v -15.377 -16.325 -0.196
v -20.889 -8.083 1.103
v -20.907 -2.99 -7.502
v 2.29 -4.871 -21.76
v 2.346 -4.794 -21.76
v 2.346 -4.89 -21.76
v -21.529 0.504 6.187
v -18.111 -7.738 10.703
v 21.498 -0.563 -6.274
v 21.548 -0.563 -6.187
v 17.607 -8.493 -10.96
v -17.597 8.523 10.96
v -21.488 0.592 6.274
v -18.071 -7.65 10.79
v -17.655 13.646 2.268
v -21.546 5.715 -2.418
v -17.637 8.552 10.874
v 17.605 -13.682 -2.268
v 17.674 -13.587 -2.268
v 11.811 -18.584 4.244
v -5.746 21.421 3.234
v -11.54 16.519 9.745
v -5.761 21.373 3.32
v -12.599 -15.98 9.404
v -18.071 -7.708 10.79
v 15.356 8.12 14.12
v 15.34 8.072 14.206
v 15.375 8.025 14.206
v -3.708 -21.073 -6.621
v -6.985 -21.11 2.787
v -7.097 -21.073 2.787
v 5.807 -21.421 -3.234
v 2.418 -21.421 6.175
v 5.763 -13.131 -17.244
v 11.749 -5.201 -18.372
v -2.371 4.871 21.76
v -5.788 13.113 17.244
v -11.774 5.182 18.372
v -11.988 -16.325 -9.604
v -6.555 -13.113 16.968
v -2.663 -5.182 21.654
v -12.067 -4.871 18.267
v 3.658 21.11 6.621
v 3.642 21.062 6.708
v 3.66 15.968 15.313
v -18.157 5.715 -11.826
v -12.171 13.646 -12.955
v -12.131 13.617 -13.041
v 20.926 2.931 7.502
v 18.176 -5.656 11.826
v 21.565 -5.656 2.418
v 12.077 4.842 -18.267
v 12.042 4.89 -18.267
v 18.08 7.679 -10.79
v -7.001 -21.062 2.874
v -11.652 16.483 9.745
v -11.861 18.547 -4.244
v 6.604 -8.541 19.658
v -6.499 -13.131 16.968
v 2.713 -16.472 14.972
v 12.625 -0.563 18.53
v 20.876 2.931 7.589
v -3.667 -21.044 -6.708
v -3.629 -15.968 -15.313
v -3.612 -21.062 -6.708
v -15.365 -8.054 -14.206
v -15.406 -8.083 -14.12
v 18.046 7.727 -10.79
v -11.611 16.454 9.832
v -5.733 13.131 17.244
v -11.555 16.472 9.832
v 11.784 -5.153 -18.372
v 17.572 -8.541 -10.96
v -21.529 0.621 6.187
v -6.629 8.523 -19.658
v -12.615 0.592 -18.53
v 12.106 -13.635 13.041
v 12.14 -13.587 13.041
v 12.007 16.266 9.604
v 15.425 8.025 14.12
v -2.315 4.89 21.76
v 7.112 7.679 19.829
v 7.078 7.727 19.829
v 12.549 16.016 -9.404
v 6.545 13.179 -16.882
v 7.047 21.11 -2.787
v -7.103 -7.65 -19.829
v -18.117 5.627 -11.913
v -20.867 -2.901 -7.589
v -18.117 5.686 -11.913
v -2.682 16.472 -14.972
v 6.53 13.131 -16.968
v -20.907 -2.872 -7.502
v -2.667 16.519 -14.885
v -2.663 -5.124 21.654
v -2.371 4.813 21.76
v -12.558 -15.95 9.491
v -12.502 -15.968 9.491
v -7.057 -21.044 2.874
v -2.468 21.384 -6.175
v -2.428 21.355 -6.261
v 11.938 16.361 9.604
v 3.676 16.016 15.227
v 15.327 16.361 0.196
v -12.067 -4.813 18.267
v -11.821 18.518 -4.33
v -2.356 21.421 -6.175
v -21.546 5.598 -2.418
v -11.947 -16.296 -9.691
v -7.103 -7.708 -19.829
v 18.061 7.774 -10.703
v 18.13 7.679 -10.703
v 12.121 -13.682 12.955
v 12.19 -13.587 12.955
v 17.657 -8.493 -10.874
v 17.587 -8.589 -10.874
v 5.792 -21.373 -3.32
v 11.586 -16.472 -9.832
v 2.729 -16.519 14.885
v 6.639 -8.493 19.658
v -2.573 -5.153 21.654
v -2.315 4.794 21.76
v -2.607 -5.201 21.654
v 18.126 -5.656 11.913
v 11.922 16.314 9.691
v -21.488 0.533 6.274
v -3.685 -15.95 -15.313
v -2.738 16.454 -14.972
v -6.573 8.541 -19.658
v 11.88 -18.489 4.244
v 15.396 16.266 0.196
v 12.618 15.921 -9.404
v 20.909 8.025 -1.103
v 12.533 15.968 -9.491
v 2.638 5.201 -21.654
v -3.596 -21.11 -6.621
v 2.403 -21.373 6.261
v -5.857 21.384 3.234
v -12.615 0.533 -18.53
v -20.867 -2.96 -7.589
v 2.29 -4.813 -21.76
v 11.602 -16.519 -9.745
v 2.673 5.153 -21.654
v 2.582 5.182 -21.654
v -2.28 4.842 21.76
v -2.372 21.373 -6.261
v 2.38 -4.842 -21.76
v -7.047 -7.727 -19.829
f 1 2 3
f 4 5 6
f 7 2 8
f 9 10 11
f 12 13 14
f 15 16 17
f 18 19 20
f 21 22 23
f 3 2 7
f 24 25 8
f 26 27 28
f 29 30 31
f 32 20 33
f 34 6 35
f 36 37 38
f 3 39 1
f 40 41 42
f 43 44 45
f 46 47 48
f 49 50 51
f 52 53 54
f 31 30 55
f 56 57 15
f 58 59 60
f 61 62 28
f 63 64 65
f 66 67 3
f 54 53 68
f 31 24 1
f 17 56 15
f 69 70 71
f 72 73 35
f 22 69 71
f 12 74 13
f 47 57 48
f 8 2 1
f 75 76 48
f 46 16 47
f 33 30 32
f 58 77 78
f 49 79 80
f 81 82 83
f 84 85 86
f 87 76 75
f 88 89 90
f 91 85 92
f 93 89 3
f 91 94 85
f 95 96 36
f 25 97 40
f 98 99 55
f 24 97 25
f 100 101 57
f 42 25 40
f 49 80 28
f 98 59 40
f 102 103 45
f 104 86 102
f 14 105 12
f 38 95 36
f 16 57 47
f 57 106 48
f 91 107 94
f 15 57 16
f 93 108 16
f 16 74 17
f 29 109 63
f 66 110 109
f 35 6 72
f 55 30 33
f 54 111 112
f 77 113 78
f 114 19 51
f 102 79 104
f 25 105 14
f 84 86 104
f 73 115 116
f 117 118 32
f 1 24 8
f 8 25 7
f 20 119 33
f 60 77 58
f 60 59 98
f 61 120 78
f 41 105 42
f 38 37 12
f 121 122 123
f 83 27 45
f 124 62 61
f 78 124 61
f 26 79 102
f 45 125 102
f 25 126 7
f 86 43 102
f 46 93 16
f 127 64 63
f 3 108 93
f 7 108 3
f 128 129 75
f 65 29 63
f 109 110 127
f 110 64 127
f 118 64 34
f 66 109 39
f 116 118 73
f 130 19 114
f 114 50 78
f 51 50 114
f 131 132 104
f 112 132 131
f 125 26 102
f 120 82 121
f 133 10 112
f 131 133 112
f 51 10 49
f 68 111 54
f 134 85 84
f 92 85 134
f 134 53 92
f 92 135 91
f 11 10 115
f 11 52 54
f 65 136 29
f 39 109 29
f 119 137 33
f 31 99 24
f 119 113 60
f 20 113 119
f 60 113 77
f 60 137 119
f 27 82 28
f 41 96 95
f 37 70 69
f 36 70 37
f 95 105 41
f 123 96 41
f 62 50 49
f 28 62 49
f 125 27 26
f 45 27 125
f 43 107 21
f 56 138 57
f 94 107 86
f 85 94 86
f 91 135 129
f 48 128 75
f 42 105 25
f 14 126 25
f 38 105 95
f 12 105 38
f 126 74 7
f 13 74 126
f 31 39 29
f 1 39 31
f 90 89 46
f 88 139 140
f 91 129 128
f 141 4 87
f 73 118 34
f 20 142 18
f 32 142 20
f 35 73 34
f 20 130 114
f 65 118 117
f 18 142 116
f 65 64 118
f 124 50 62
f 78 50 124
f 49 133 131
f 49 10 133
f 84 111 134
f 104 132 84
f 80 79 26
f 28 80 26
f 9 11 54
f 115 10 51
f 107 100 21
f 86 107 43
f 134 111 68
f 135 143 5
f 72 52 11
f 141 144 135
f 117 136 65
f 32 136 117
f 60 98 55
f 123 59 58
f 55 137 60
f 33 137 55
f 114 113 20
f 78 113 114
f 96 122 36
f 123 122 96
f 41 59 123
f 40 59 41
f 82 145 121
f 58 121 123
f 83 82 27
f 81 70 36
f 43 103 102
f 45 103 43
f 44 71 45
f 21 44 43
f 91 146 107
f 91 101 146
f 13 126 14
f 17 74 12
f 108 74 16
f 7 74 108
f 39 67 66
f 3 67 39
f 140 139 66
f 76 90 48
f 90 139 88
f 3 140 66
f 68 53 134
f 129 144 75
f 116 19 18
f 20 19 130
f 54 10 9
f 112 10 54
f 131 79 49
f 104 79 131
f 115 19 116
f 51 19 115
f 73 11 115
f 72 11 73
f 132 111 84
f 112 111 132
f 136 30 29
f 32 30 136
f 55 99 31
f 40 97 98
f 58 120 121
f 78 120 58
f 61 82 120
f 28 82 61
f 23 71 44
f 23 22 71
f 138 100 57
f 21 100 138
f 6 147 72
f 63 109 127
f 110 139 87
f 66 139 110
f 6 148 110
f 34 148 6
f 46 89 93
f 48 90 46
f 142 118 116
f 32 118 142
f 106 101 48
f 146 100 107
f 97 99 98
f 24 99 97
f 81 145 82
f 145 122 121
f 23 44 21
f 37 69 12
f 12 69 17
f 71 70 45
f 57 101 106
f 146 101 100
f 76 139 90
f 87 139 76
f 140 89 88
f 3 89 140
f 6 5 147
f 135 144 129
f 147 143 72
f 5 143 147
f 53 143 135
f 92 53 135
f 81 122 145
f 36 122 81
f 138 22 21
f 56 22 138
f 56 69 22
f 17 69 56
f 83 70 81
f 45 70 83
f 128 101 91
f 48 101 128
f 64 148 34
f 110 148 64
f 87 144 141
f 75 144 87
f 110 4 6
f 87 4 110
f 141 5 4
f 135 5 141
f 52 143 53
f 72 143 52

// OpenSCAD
// Auto-generated OpenSCAD file

    inner_points = 10*[[0.3627043479586896, 2.1014561533744316, 0.6621144681370361], [0.23873649941994707, -2.132561977195345, 0.6174562938096761], [-0.5776558269711908, 2.1325619771953757, 0.3233591447393587], [-0.7016236755099334, -2.1014561533744005, 0.2787009704119987], [0.7016236755099334, 2.1014561533744005, -0.2787009704119987], [0.5776558269711908, -2.1325619771953757, -0.3233591447393587], [-0.23873649941994707, 2.132561977195345, -0.6174562938096761], [-0.3627043479586896, -2.1014561533744316, -0.6621144681370361], [-0.23303014809308217, 0.484205136480117, 2.167327920132479], [-0.2622949873726234, -0.5153109603009306, 2.1567855552401864], [-1.1733903230229628, 0.5153109603010614, 1.8285725967348017], [-1.202655162302504, -0.48420513647998625, 1.8180302318425088], [1.202655162302504, 0.48420513647998625, -1.8180302318425088], [1.1733903230229628, -0.5153109603010614, -1.8285725967348017], [0.2622949873726234, 0.5153109603009306, -2.1567855552401864], [0.23303014809308217, -0.484205136480117, -2.167327920132479], [1.1907004237534802, 1.6266370713489897, 0.960391751571334], [1.8076227287528912, -0.5656412404913346, 1.1826318256546142], [-2.146542056304135, 0.5656412404913654, -0.2418163871055795], [-1.5296197513047238, -1.6266370713489589, -0.019576313022299174], [1.5296197513047238, 1.6266370713489589, 0.019576313022299174], [2.146542056304135, -0.5656412404913654, 0.2418163871055795], [-1.8076227287528912, 0.5656412404913346, -1.1826318256546142], [-1.1907004237534802, -1.6266370713489897, -0.960391751571334], [2.0826192779262027, 0.29308837441609126, 0.7502427110556056], [1.1780068582222707, -1.848859657233879, 0.4243651580114814], [-1.1780068582222707, 1.848859657233879, -0.4243651580114814], [-2.0826192779262027, -0.29308837441609126, -0.7502427110556056], [-0.5748026513077584, 1.308383556837762, 1.7157512517104363], [-0.6514189952169003, -1.3083835568376503, 1.6881509821006098], [0.6514189952169003, 1.3083835568376503, -1.6881509821006098], [0.5748026513077584, -1.308383556837762, -1.7157512517104363], [1.2574763777948448, -0.05627096391608096, 1.8443575345923855], [-2.1447786967682596, 0.056270963916161786, 0.618729260669626], [2.1447786967682596, -0.056270963916161786, -0.618729260669626], [-1.2574763777948448, 0.05627096391608096, -1.8443575345923855], [0.36446770749456503, 1.5920858767992276, 1.5226601159122415], [0.2697646982353637, -1.6424161569895013, 1.4885443064771746], [-1.1570670172087785, 1.642416156989582, 0.9745424887848368], [-1.2517700264679799, -1.592085876799147, 0.94042667934977], [1.2517700264679799, 1.592085876799147, -0.94042667934977], [1.1570670172087785, -1.642416156989582, -0.9745424887848368], [-0.2697646982353637, 1.6424161569895013, -1.4885443064771746], [-0.36446770749456503, -1.5920858767992276, -1.5226601159122415], [0.7062402107092415, 0.767907456441583, 1.9742367843342843], [0.6588887060796405, -0.8493435604527816, 1.9571788796167506], [-1.7556546889239826, 0.8493435604528814, 1.0873638338092022], [-1.8030061935535835, -0.7679074564414831, 1.0703059290916686], [1.8030061935535835, 0.7679074564414831, -1.0703059290916686], [1.7556546889239826, -0.8493435604528814, -1.0873638338092022], [-0.6588887060796405, 0.8493435604527816, -1.9571788796167506], [-0.7062402107092415, -0.767907456441583, -1.9742367843342843], [1.5324729269681563, 0.8024586509913448, 1.4119684199933769], [1.209035057037687, -1.3587138370280352, 1.2954531706789796], [-1.7574180484598583, 1.3587138370280851, 0.22681818603399673], [-2.0808559183903275, -0.8024586509912949, 0.11030293671959968], [2.0808559183903275, 0.8024586509912949, -0.11030293671959968], [1.7574180484598583, -1.3587138370280851, -0.22681818603399673], [-1.209035057037687, 1.3587138370280352, -1.2954531706789796], [-1.5324729269681563, -0.8024586509913448, -1.4119684199933769]];

    outer_points = 10*[[-0.7016236755099551, -2.10145615337441, 0.2787009704118737], [-0.5776558269712173, 2.1325619771953654, 0.3233591447393821], [0.23873649941989808, -2.1325619771953654, 0.6174562938096255], [0.36270434795863593, 2.10145615337441, 0.6621144681371339], [-0.36270434795863593, -2.10145615337441, -0.6621144681371339], [-0.23873649941989808, 2.1325619771953654, -0.6174562938096255], [0.5776558269712173, -2.1325619771953654, -0.3233591447393821], [0.7016236755099551, 2.10145615337441, -0.2787009704118737], [-1.2026551623026496, -0.48420513648004604, 1.8180302318423964], [-1.1733903230231093, 0.5153109603010012, 1.8285725967347242], [-0.26229498737279616, -0.5153109603010012, 2.1567855552401483], [-0.23303014809325606, 0.48420513648004604, 2.167327920132476], [0.23303014809325606, -0.48420513648004604, -2.167327920132476], [0.26229498737279616, 0.5153109603010012, -2.1567855552401483], [1.1733903230231093, -0.5153109603010012, -1.8285725967347242], [1.2026551623026496, 0.48420513648004604, -1.8180302318423964], [-1.5296197513047218, -1.6266370713489584, -0.019576313022475034], [-2.1465420563041158, 0.5656412404913728, -0.2418163871057331], [1.8076227287527964, -0.5656412404913728, 1.1826318256547408], [1.1907004237534027, 1.6266370713489584, 0.9603917515714826], [-1.1907004237534027, -1.6266370713489584, -0.9603917515714826], [-1.8076227287527964, 0.5656412404913728, -1.1826318256547408], [2.1465420563041158, -0.5656412404913728, 0.2418163871057331], [1.5296197513047218, 1.6266370713489584, 0.019576313022475034], [-2.0826192779261423, -0.2930883744160672, -0.7502427110557822], [-1.178006858222237, 1.8488596572338925, -0.42436515801151536], [1.178006858222237, -1.8488596572338925, 0.42436515801151536], [2.0826192779261423, 0.2930883744160672, 0.7502427110557822], [-0.6514189952170353, -1.3083835568377056, 1.6881509821005147], [-0.5748026513078963, 1.3083835568377056, 1.7157512517104327], [0.5748026513078963, -1.3083835568377056, -1.7157512517104327], [0.6514189952170353, 1.3083835568377056, -1.6881509821005147], [-2.144778696768309, 0.05627096391614097, 0.6187292606694557], [1.2574763777946967, -0.05627096391614097, 1.8443575345924843], [-1.2574763777946967, 0.05627096391614097, -1.8443575345924843], [2.144778696768309, -0.05627096391614097, -0.6187292606694557], [-1.2517700264680547, -1.5920858767991781, 0.9404266793496172], [-1.157067017208857, 1.6424161569895497, 0.9745424887847978], [0.2697646982352448, -1.6424161569895497, 1.4885443064771422], [0.3644677074944424, 1.5920858767991781, 1.5226601159123228], [-0.3644677074944424, -1.5920858767991781, -1.5226601159123228], [-0.2697646982352448, 1.6424161569895497, -1.4885443064771422], [1.157067017208857, -1.6424161569895497, -0.9745424887847978], [1.2517700264680547, 1.5920858767991781, -0.9404266793496172], [-1.803006193553669, -0.7679074564415186, 1.070305929091499], [-1.75565468892407, 0.8493435604528453, 1.0873638338090892], [0.6588887060794838, -0.8493435604528453, 1.9571788796167757], [0.7062402107090827, 0.7679074564415186, 1.974236784334366], [-0.7062402107090827, -0.7679074564415186, -1.974236784334366], [-0.6588887060794838, 0.8493435604528453, -1.9571788796167757], [1.75565468892407, -0.8493435604528453, -1.0873638338090892], [1.803006193553669, 0.7679074564415186, -1.070305929091499], [-2.0808559183903363, -0.802458650991299, 0.11030293671940661], [-1.7574180484598767, 1.3587138370280771, 0.22681818603390036], [1.2090350570375834, -1.3587138370280771, 1.295453170679032], [1.532472926968043, 0.802458650991299, 1.4119684199935258], [-1.532472926968043, -0.802458650991299, -1.4119684199935258], [-1.2090350570375834, 1.3587138370280771, -1.295453170679032], [1.7574180484598767, -1.3587138370280771, -0.22681818603390036], [2.0808559183903363, 0.802458650991299, -0.11030293671940661]];

    // Convex hull for inner set (I)
    module inner_hull() {
        hull() {
            for (p = inner_points) {
                translate(p) sphere(r=0.1);
            }
        }
    }

    // Convex hull for outer set (O) minus inner hull (O \ I)
    module outer_minus_inner() {
        difference() {
            hull() {
                for (p = outer_points) {
                    translate(p) sphere(r=0.1);
                }
            }
            inner_hull(); // Subtract inner hull
        }
    }

    // Convex hull for outer set (O) minus all translated inner hulls
    module outer_minus_AllTranslationInner() {
        difference() {
            hull() {
                for (p = outer_points) {
                    translate(p) sphere(r=0.1);
                }
            }
            hull() {
                translate([0,0,50]) inner_hull();
                translate([0,0,-50]) inner_hull();
            }; // Subtract translated inner hulls
        }
    }

    // Difference between outer_minus_inner and outer_minus_AllTranslationInner
    module outer_minus_inner_diff() {
        difference() {
            // Outer minus inner
            difference() {
                hull() {
                    for (p = outer_points) {
                        translate(p) sphere(r=0.1);
                    }
                }
                inner_hull();
            }

            // Subtract Outer minus AllTranslationInner
            difference() {
                hull() {
                    for (p = outer_points) {
                        translate(p) sphere(r=0.1);
                    }
                }
                hull() {
                    translate([0,0,50]) inner_hull();
                    translate([0,0,-50]) inner_hull();
                };
            }
        }
    }

    // Rendering all with colors applied
    color([1, 0, 0, 0.5]) inner_hull(); // Transparent red
    
